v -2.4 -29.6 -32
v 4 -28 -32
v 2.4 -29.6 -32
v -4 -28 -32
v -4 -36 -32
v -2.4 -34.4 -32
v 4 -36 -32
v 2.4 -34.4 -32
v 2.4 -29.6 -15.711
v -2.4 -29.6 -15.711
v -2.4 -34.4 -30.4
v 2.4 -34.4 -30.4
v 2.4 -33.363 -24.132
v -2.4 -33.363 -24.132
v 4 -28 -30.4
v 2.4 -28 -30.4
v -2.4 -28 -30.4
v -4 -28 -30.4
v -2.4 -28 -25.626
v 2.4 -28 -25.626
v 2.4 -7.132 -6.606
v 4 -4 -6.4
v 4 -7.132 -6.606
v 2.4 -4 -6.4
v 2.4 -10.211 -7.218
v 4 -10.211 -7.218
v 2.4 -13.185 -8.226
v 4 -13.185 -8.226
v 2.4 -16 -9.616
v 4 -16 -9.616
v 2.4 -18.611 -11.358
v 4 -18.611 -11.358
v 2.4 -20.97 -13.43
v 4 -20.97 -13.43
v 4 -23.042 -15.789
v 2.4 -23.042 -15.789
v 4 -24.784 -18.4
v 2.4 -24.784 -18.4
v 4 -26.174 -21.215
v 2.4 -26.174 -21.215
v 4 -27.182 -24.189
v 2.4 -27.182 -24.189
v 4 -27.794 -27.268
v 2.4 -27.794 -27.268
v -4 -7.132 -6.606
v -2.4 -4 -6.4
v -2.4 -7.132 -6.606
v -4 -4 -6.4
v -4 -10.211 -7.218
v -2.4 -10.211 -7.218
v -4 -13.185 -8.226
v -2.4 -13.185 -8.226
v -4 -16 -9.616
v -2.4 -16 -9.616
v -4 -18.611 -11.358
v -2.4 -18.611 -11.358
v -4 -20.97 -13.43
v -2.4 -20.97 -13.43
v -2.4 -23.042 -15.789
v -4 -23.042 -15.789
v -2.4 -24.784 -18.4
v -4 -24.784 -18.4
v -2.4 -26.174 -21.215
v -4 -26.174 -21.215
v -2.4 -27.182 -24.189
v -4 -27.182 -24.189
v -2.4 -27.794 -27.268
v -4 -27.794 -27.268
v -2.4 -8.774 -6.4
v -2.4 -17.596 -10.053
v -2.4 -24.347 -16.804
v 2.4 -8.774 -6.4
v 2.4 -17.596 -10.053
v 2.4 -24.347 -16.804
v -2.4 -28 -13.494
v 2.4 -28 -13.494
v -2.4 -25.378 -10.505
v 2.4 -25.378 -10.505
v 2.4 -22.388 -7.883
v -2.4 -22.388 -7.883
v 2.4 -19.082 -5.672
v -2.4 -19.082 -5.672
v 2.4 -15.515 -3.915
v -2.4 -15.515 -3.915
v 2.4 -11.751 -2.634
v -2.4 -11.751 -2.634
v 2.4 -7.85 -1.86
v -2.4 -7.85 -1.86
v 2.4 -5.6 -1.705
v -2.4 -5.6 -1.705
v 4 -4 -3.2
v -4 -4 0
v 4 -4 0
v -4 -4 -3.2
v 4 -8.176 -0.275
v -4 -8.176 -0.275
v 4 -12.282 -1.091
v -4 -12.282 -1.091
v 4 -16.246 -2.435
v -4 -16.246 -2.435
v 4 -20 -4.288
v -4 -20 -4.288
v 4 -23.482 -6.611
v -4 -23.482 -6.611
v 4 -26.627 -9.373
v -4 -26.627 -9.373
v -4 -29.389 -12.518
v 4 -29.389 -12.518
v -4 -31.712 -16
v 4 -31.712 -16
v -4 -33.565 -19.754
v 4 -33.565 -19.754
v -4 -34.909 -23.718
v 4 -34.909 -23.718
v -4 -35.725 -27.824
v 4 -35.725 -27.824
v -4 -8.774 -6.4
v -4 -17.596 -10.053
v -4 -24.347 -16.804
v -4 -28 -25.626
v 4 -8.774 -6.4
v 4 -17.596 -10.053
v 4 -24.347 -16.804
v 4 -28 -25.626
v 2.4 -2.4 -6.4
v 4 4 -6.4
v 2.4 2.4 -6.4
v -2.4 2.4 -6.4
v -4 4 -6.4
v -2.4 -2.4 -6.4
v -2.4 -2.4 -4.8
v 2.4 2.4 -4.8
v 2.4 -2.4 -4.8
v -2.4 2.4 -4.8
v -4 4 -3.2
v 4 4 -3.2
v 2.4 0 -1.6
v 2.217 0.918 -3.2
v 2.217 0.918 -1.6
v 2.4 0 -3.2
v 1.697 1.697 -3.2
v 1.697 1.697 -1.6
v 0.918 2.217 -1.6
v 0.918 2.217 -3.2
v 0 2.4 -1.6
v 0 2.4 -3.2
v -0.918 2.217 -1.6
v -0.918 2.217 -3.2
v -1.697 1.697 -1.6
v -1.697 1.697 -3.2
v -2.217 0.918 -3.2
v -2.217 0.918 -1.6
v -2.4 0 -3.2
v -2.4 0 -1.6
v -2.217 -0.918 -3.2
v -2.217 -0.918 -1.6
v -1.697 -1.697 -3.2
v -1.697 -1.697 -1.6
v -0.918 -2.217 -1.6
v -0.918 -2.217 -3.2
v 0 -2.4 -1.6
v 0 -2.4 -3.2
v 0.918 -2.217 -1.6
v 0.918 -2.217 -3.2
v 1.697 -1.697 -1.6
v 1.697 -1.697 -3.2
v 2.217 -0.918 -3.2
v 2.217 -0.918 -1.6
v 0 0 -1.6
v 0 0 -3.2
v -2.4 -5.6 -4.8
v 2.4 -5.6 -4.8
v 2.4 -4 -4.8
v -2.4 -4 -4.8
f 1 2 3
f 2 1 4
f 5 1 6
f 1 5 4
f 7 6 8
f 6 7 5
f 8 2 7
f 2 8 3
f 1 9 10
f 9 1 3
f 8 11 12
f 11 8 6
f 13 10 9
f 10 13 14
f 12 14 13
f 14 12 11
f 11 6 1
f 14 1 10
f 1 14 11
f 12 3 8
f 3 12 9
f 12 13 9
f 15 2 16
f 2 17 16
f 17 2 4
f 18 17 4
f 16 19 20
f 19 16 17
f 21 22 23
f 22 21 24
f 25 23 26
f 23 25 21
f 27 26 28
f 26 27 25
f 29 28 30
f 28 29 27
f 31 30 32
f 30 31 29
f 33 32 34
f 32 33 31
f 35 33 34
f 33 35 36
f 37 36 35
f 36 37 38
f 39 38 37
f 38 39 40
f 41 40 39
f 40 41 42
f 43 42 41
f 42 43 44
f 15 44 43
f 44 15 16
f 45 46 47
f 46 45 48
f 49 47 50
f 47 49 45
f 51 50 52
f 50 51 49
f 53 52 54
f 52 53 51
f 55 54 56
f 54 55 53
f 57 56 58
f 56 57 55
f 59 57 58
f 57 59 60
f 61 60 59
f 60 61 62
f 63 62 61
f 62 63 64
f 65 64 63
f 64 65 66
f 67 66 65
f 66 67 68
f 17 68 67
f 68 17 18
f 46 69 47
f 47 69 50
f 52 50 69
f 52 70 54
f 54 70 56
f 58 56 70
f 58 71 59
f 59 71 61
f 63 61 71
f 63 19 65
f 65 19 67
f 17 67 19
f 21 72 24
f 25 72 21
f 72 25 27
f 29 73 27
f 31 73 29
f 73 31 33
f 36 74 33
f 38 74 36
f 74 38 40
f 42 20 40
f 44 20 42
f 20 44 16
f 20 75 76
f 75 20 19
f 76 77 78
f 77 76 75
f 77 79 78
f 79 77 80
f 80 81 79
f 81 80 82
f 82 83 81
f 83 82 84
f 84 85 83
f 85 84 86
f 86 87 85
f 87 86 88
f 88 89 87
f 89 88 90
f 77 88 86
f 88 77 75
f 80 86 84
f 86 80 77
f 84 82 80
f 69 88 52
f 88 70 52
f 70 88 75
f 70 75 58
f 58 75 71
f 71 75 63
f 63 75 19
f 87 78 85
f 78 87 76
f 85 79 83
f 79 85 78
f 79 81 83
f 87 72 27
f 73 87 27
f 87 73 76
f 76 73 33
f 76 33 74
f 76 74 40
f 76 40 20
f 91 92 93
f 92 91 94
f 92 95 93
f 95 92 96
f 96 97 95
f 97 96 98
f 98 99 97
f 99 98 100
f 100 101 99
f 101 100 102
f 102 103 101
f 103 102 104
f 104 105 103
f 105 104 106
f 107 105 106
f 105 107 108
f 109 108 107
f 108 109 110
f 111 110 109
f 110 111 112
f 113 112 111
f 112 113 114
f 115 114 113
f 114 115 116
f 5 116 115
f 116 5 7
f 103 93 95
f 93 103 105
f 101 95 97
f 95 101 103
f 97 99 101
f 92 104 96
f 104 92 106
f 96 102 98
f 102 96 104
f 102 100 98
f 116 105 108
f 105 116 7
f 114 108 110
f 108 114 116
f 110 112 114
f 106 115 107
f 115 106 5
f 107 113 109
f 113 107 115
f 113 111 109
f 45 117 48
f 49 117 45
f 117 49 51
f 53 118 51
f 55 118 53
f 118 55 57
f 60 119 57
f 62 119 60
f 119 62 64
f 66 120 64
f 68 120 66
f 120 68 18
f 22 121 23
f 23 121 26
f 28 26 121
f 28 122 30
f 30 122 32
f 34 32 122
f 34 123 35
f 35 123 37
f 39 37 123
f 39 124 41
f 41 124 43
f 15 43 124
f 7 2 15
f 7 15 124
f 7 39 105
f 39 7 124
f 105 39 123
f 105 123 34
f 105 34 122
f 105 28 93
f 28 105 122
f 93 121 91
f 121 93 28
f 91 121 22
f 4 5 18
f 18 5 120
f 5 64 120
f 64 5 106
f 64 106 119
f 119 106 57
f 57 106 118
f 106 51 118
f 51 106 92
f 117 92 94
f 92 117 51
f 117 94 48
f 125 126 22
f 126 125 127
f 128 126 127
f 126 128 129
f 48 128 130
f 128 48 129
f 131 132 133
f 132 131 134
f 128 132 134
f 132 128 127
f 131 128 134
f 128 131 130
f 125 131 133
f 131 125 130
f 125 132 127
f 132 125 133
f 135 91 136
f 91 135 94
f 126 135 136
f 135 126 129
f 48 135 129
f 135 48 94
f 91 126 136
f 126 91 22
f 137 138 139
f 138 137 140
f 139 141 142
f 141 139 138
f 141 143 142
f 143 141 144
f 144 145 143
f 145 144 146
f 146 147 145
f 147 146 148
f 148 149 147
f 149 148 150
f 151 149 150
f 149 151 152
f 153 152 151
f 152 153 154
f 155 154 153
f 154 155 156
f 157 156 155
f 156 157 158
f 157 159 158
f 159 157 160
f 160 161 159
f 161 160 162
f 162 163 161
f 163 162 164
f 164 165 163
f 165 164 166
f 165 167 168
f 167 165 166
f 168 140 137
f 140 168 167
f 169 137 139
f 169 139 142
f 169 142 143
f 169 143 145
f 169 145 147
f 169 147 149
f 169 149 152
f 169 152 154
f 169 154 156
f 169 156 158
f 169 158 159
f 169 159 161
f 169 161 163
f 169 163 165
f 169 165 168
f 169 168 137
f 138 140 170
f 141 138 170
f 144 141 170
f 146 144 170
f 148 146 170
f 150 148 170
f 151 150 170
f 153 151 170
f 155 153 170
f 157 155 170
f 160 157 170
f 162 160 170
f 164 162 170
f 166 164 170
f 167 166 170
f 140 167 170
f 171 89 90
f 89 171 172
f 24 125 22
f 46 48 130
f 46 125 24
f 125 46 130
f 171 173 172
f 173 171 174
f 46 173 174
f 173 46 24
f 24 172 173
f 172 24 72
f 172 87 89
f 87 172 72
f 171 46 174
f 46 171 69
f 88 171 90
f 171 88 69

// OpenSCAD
use <../lib.scad>
use <../p/box2-5.scad>
use <../p/box4-4a.scad>
use <../p/box5.scad>
use <s/6060s01.scad>
use <../p/stud.scad>
function ldraw_lib__5845() = [
// 0 Arch 1 x 5 x 3.333 with Curved Top and Two Studs
// 0 Name: 5845.dat
// 0 Author: Gerald Lasser [GeraldLasser]
// 0 !LDRAW_ORG Part UPDATE 2025-05
// 0 !LICENSE Licensed under CC BY 4.0 : see CAreadme.txt
// 
// 0 BFC CERTIFY CCW
  [0,"BFC","CERTIFY"],
  [0,"BFC","CCW"],
// 
// 0 !HISTORY 2025-05-28 [OrionP] Official Update 2025-05
// 
// 1 16 0 0 10 1 0 0 0 1 0 0 0 1 s\6060s01.dat
  [1,16,0,0,10,1,0,0,0,1,0,0,0,1, ldraw_lib__s__6060s01()],
// 
// 4 16 10 16 -10 6 16 -6 6 16 6 10 16 10
  [4,16,10,16,-10,6,16,-6,6,16,6,10,16,10],
// 4 16 10 16 10 6 16 6 -6 16 6 -10 16 10
  [4,16,10,16,10,6,16,6,-6,16,6,-10,16,10],
// 4 16 -10 16 10 -6 16 6 -6 16 -6 -10 16 -10
  [4,16,-10,16,10,-6,16,6,-6,16,-6,-10,16,-10],
// 
// 0 BFC INVERTNEXT
  [0,"BFC","INVERTNEXT"],
// 1 16 0 16 0 6 0 0 0 -4 0 0 0 6 box5.dat
  [1,16,0,16,0,6,0,0,0,-4,0,0,0,6, ldraw_lib__box5()],
// 1 16 0 16 0 10 0 0 0 -8 0 0 0 10 box4-4a.dat
  [1,16,0,16,0,10,0,0,0,-8,0,0,0,10, ldraw_lib__box4_4a()],
// 1 16 0 8 0 1 0 0 0 1 0 0 0 1 stud.dat
  [1,16,0,8,0,1,0,0,0,1,0,0,0,1, ldraw_lib__stud()],
// 
// 4 16 6 12 -14 6 4.2636 -14 -6 4.2636 -14 -6 12 -14
  [4,16,6,12,-14,6,4.2636,-14,-6,4.2636,-14,-6,12,-14],
// 2 24 -6 4.2636 -14 6 4.2636 -14
  [2,24,-6,4.2636,-14,6,4.2636,-14],
// 2 24 6 4.2636 -14 6 12 -14
  [2,24,6,4.2636,-14,6,12,-14],
// 2 24 -6 4.2636 -14 -6 12 -14
  [2,24,-6,4.2636,-14,-6,12,-14],
// 3 16 6 16 -10 6 16 -6 10 16 -10
  [3,16,6,16,-10,6,16,-6,10,16,-10],
// 3 16 -6 16 -10 -10 16 -10 -6 16 -6
  [3,16,-6,16,-10,-10,16,-10,-6,16,-6],
// 4 16 -6 16 -6 6 16 -6 6 16 -10 -6 16 -10
  [4,16,-6,16,-6,6,16,-6,6,16,-10,-6,16,-10],
// 0 BFC INVERTNEXT
  [0,"BFC","INVERTNEXT"],
// 1 16 0 14 -12 6 0 0 0 -2 0 0 0 2 box2-5.dat
  [1,16,0,14,-12,6,0,0,0,-2,0,0,0,2, ldraw_lib__box2_5()],
// 4 16 6 16 -21.934 6 12 -14 6 12 -10 6 16 -10
  [4,16,6,16,-21.934,6,12,-14,6,12,-10,6,16,-10],
// 4 16 6 12 -14 6 16 -21.934 6 4.6509 -19.625 6 4.2636 -14
  [4,16,6,12,-14,6,16,-21.934,6,4.6509,-19.625,6,4.2636,-14],
// 4 16 -6 16 -10 -6 12 -10 -6 12 -14 -6 16 -21.934
  [4,16,-6,16,-10,-6,12,-10,-6,12,-14,-6,16,-21.934],
// 4 16 -6 16 -21.934 -6 12 -14 -6 4.2636 -14 -6 4.6509 -19.625
  [4,16,-6,16,-21.934,-6,12,-14,-6,4.2636,-14,-6,4.6509,-19.625],
];
module ldraw_lib__5845(step=0, col=false, unit=2/5, alt=false, line=0.2, solid=!$preview)
    makepoly(ldraw_lib__5845(), step=step, col=col, unit=unit, alt=alt, line=line, solid=solid);
ldraw_lib__5845(line=0.2);
